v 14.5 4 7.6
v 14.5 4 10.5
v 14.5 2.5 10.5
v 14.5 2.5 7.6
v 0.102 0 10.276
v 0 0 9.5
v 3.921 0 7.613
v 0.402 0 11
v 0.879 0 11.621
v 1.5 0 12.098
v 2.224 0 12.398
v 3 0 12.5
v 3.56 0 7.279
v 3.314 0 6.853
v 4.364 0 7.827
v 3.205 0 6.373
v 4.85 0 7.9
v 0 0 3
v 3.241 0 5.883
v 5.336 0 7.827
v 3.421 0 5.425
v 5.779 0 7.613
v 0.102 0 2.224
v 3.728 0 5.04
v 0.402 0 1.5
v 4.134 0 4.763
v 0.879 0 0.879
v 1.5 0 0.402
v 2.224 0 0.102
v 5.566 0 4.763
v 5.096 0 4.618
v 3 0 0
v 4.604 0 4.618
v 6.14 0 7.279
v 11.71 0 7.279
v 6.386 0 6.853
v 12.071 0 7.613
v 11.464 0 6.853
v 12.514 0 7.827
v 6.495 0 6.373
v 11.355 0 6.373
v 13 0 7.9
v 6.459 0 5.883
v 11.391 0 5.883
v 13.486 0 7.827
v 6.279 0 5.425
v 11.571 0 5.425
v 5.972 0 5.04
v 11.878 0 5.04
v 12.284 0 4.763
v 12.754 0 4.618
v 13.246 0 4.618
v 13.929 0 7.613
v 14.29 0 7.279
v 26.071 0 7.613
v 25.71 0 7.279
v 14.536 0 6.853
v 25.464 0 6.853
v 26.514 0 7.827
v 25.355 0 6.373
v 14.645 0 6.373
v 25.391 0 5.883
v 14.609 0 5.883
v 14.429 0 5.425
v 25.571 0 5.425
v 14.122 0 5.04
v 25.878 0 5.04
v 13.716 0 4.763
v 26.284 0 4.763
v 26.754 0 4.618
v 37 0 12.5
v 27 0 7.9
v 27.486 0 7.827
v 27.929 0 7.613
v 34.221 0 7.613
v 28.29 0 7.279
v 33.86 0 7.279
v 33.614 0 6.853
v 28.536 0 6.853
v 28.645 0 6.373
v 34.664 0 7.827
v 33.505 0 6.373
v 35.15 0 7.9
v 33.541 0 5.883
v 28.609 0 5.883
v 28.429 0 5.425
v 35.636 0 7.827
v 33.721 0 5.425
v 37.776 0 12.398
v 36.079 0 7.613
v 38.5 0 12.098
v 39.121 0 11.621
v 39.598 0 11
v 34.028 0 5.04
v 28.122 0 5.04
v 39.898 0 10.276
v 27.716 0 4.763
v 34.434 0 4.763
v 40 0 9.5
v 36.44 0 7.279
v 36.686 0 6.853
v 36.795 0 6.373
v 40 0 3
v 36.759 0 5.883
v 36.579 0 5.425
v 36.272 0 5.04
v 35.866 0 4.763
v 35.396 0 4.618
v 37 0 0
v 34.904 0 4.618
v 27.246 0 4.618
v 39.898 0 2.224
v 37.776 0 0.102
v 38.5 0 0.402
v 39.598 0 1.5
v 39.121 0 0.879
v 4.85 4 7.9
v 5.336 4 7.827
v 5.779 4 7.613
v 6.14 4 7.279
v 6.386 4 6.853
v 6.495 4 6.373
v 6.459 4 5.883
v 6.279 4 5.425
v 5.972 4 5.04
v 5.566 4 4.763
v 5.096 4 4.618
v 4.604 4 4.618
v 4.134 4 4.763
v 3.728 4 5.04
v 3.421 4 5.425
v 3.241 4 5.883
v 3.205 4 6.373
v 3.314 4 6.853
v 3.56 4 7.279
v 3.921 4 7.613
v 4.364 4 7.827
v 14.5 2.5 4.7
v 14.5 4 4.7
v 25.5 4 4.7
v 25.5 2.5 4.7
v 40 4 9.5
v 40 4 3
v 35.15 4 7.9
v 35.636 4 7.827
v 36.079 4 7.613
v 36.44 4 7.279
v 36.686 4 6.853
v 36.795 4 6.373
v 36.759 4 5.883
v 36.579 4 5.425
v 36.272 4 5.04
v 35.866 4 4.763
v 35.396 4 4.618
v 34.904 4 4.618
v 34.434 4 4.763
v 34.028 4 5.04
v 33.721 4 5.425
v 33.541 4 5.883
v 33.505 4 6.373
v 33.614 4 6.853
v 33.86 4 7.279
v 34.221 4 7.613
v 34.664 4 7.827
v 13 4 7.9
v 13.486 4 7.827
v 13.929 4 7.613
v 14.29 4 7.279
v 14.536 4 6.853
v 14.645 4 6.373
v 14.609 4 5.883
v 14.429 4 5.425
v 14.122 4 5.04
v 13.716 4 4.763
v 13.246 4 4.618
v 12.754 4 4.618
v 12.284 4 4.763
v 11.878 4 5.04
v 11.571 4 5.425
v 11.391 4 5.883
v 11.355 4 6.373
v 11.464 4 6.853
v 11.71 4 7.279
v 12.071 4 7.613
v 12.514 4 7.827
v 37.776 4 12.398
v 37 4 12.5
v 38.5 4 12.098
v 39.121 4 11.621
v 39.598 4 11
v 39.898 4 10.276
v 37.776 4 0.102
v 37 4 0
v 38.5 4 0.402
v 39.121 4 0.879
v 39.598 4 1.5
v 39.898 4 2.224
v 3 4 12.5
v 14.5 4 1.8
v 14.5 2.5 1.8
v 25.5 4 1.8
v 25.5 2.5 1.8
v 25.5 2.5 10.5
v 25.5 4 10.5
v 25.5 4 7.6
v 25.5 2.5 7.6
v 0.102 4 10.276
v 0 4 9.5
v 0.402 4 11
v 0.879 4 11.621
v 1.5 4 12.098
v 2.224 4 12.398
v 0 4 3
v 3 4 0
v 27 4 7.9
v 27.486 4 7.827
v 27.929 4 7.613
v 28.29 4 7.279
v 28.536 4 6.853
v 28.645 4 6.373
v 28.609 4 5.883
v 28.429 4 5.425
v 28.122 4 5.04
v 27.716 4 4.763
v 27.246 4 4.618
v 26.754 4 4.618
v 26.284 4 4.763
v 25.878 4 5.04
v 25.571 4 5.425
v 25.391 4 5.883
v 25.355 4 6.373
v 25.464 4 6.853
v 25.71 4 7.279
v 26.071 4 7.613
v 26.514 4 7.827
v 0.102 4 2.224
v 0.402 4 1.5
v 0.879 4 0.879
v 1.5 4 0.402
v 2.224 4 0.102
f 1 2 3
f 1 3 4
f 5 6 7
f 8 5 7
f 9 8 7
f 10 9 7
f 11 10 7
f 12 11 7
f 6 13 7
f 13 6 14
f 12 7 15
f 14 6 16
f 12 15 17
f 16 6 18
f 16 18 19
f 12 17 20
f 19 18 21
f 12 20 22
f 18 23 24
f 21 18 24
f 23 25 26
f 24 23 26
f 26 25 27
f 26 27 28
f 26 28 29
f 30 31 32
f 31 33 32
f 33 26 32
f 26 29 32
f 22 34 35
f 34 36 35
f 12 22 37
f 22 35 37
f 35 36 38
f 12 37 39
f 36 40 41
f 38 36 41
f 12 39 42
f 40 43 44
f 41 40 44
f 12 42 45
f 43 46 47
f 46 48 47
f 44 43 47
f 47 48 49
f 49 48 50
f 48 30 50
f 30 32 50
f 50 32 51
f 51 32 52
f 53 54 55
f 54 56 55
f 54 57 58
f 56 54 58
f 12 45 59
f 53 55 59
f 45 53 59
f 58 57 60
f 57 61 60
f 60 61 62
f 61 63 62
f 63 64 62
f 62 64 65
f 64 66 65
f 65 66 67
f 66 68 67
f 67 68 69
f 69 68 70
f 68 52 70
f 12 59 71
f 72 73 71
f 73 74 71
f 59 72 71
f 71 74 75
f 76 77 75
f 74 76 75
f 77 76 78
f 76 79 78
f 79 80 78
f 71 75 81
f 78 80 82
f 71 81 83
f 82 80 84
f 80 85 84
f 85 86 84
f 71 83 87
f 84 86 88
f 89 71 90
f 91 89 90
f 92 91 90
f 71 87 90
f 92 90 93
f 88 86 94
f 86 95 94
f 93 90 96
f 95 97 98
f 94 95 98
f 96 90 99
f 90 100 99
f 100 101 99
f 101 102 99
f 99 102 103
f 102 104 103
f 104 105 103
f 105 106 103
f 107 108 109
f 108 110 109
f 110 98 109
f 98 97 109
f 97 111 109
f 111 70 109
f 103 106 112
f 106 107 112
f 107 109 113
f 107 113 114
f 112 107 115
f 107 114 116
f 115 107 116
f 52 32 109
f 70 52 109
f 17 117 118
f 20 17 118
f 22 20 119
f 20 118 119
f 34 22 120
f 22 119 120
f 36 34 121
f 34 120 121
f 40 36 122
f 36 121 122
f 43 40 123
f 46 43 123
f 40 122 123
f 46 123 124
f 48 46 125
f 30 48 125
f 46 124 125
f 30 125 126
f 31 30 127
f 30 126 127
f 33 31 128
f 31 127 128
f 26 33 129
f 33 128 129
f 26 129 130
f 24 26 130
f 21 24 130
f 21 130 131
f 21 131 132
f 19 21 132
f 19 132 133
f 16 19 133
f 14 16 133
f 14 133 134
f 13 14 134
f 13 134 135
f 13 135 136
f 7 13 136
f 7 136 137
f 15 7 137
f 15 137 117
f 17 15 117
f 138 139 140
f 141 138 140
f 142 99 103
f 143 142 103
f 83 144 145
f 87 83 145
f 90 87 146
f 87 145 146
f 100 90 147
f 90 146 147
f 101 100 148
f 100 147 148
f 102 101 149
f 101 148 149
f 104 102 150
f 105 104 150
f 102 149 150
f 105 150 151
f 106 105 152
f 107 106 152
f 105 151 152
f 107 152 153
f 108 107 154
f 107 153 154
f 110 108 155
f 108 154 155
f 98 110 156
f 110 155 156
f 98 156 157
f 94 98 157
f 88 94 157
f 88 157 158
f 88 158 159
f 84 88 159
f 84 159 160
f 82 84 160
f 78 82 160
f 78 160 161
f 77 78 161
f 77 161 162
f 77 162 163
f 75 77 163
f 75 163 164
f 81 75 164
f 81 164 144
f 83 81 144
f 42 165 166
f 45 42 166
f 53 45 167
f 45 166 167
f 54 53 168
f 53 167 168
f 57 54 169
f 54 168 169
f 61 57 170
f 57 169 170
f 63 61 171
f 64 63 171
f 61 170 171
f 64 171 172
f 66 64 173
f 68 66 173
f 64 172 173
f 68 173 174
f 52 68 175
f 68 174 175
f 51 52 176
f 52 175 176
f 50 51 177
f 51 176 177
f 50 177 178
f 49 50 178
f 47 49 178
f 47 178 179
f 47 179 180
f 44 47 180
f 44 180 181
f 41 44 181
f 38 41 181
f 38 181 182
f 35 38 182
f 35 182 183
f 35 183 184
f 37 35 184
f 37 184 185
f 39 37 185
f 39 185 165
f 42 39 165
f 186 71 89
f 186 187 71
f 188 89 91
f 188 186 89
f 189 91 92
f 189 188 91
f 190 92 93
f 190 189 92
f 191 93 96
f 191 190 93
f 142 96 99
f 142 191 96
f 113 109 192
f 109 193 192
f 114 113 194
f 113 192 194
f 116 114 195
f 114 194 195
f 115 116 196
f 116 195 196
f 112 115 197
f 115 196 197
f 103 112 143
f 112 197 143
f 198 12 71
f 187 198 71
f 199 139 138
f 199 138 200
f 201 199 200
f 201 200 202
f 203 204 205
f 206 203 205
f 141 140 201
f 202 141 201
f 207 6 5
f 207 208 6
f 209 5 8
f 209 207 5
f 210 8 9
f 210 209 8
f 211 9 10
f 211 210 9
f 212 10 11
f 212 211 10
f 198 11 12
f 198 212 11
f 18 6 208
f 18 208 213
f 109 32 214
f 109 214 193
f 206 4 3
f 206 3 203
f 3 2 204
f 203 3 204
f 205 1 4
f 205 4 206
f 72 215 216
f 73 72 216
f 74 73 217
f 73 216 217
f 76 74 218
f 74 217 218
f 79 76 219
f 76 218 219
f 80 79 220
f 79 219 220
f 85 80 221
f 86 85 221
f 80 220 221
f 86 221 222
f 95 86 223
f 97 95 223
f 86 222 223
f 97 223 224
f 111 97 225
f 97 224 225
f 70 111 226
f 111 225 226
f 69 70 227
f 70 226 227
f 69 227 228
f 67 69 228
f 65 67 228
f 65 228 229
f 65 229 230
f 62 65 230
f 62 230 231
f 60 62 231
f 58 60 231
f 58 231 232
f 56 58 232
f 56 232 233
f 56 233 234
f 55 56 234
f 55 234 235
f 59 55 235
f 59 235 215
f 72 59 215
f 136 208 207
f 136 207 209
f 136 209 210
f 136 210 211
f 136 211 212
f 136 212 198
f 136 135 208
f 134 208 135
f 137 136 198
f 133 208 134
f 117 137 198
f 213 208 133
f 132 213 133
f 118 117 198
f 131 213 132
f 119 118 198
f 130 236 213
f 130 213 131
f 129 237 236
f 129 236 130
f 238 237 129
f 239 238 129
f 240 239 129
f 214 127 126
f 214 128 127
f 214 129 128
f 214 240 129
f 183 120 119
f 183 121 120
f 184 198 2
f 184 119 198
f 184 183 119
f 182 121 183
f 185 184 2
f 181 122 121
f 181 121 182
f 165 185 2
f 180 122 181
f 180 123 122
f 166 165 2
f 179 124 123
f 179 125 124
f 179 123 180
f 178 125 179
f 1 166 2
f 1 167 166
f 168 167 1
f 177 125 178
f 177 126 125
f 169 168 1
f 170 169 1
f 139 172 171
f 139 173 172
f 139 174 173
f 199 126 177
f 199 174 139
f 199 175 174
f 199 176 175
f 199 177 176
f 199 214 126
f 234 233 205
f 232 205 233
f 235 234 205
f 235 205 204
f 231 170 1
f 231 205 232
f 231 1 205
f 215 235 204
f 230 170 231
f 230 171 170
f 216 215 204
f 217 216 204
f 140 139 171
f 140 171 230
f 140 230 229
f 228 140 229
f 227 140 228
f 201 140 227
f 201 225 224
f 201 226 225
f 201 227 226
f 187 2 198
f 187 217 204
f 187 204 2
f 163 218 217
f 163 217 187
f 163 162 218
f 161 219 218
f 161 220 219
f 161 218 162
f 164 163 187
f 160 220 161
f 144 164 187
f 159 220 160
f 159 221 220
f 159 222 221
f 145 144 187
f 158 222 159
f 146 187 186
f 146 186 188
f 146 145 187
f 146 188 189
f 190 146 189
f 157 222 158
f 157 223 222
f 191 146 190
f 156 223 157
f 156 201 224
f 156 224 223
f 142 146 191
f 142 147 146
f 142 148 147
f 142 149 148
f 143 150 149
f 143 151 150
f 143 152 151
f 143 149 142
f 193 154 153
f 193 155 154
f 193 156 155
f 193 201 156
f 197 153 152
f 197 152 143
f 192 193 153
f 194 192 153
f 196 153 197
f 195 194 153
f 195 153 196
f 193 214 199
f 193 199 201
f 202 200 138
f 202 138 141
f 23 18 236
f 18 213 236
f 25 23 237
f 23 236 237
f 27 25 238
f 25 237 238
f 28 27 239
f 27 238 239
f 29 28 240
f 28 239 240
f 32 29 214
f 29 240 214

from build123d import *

# Parameters (mm, degrees)
SKETCH1_W           = 40
SKETCH1_H           = 12.5
BOSS_EXTRUDE1_DEPTH = 4
SKETCH2_R           = 1.65
CUT_EXTRUDE1_DEPTH  = 43.09809972
SKETCH3_W           = 11
SKETCH3_H           = 2.9
CUT_EXTRUDE2_DEPTH  = 1.5
FILLET1_R           = 3


with BuildPart() as part:
    # Sketch1 → Boss-Extrude1 (new body)
    with BuildSketch(Plane(origin=(0, 0, 0), x_dir=(1, 0, 0), z_dir=(0, 1, 0))):
        with Locations((20, -6.25)):
            Rectangle(SKETCH1_W, SKETCH1_H)
    extrude(amount=BOSS_EXTRUDE1_DEPTH)

    # Sketch2 → Cut-Extrude1 (cut, through all)
    with BuildSketch(Plane(origin=(0, 4, 0), x_dir=(1, 0, 0), z_dir=(0, 1, 0))):
        with Locations(Location((4.85, -6.25, 0), (0, 0, 270))):
            Circle(SKETCH2_R)
        with Locations(Location((13, -6.25, 0), (0, 0, 270))):
            Circle(SKETCH2_R)
        with Locations(Location((27, -6.25, 0), (0, 0, 270))):
            Circle(SKETCH2_R)
        with Locations(Location((35.15, -6.25, 0), (0, 0, 270))):
            Circle(SKETCH2_R)
    extrude(amount=-CUT_EXTRUDE1_DEPTH, mode=Mode.SUBTRACT)

    # Sketch3 → Cut-Extrude2 (cut)
    with BuildSketch(Plane(origin=(0, 4, 0), x_dir=(1, 0, 0), z_dir=(0, 1, 0))):
        with Locations((20, -3.25)):
            Rectangle(SKETCH3_W, SKETCH3_H)
        with Locations((20, -9.05)):
            Rectangle(SKETCH3_W, SKETCH3_H)
    extrude(amount=-CUT_EXTRUDE2_DEPTH, mode=Mode.SUBTRACT)

    # Fillet1
    fillet1_edges = [part.edges().sort_by_distance(p)[0] for p in [
        (0, 2, 0),
        (40, 2, 0),
        (40, 2, 12.5),
        (0, 2, 12.5),
    ]]
    fillet(fillet1_edges, radius=FILLET1_R)


solid = part.part
